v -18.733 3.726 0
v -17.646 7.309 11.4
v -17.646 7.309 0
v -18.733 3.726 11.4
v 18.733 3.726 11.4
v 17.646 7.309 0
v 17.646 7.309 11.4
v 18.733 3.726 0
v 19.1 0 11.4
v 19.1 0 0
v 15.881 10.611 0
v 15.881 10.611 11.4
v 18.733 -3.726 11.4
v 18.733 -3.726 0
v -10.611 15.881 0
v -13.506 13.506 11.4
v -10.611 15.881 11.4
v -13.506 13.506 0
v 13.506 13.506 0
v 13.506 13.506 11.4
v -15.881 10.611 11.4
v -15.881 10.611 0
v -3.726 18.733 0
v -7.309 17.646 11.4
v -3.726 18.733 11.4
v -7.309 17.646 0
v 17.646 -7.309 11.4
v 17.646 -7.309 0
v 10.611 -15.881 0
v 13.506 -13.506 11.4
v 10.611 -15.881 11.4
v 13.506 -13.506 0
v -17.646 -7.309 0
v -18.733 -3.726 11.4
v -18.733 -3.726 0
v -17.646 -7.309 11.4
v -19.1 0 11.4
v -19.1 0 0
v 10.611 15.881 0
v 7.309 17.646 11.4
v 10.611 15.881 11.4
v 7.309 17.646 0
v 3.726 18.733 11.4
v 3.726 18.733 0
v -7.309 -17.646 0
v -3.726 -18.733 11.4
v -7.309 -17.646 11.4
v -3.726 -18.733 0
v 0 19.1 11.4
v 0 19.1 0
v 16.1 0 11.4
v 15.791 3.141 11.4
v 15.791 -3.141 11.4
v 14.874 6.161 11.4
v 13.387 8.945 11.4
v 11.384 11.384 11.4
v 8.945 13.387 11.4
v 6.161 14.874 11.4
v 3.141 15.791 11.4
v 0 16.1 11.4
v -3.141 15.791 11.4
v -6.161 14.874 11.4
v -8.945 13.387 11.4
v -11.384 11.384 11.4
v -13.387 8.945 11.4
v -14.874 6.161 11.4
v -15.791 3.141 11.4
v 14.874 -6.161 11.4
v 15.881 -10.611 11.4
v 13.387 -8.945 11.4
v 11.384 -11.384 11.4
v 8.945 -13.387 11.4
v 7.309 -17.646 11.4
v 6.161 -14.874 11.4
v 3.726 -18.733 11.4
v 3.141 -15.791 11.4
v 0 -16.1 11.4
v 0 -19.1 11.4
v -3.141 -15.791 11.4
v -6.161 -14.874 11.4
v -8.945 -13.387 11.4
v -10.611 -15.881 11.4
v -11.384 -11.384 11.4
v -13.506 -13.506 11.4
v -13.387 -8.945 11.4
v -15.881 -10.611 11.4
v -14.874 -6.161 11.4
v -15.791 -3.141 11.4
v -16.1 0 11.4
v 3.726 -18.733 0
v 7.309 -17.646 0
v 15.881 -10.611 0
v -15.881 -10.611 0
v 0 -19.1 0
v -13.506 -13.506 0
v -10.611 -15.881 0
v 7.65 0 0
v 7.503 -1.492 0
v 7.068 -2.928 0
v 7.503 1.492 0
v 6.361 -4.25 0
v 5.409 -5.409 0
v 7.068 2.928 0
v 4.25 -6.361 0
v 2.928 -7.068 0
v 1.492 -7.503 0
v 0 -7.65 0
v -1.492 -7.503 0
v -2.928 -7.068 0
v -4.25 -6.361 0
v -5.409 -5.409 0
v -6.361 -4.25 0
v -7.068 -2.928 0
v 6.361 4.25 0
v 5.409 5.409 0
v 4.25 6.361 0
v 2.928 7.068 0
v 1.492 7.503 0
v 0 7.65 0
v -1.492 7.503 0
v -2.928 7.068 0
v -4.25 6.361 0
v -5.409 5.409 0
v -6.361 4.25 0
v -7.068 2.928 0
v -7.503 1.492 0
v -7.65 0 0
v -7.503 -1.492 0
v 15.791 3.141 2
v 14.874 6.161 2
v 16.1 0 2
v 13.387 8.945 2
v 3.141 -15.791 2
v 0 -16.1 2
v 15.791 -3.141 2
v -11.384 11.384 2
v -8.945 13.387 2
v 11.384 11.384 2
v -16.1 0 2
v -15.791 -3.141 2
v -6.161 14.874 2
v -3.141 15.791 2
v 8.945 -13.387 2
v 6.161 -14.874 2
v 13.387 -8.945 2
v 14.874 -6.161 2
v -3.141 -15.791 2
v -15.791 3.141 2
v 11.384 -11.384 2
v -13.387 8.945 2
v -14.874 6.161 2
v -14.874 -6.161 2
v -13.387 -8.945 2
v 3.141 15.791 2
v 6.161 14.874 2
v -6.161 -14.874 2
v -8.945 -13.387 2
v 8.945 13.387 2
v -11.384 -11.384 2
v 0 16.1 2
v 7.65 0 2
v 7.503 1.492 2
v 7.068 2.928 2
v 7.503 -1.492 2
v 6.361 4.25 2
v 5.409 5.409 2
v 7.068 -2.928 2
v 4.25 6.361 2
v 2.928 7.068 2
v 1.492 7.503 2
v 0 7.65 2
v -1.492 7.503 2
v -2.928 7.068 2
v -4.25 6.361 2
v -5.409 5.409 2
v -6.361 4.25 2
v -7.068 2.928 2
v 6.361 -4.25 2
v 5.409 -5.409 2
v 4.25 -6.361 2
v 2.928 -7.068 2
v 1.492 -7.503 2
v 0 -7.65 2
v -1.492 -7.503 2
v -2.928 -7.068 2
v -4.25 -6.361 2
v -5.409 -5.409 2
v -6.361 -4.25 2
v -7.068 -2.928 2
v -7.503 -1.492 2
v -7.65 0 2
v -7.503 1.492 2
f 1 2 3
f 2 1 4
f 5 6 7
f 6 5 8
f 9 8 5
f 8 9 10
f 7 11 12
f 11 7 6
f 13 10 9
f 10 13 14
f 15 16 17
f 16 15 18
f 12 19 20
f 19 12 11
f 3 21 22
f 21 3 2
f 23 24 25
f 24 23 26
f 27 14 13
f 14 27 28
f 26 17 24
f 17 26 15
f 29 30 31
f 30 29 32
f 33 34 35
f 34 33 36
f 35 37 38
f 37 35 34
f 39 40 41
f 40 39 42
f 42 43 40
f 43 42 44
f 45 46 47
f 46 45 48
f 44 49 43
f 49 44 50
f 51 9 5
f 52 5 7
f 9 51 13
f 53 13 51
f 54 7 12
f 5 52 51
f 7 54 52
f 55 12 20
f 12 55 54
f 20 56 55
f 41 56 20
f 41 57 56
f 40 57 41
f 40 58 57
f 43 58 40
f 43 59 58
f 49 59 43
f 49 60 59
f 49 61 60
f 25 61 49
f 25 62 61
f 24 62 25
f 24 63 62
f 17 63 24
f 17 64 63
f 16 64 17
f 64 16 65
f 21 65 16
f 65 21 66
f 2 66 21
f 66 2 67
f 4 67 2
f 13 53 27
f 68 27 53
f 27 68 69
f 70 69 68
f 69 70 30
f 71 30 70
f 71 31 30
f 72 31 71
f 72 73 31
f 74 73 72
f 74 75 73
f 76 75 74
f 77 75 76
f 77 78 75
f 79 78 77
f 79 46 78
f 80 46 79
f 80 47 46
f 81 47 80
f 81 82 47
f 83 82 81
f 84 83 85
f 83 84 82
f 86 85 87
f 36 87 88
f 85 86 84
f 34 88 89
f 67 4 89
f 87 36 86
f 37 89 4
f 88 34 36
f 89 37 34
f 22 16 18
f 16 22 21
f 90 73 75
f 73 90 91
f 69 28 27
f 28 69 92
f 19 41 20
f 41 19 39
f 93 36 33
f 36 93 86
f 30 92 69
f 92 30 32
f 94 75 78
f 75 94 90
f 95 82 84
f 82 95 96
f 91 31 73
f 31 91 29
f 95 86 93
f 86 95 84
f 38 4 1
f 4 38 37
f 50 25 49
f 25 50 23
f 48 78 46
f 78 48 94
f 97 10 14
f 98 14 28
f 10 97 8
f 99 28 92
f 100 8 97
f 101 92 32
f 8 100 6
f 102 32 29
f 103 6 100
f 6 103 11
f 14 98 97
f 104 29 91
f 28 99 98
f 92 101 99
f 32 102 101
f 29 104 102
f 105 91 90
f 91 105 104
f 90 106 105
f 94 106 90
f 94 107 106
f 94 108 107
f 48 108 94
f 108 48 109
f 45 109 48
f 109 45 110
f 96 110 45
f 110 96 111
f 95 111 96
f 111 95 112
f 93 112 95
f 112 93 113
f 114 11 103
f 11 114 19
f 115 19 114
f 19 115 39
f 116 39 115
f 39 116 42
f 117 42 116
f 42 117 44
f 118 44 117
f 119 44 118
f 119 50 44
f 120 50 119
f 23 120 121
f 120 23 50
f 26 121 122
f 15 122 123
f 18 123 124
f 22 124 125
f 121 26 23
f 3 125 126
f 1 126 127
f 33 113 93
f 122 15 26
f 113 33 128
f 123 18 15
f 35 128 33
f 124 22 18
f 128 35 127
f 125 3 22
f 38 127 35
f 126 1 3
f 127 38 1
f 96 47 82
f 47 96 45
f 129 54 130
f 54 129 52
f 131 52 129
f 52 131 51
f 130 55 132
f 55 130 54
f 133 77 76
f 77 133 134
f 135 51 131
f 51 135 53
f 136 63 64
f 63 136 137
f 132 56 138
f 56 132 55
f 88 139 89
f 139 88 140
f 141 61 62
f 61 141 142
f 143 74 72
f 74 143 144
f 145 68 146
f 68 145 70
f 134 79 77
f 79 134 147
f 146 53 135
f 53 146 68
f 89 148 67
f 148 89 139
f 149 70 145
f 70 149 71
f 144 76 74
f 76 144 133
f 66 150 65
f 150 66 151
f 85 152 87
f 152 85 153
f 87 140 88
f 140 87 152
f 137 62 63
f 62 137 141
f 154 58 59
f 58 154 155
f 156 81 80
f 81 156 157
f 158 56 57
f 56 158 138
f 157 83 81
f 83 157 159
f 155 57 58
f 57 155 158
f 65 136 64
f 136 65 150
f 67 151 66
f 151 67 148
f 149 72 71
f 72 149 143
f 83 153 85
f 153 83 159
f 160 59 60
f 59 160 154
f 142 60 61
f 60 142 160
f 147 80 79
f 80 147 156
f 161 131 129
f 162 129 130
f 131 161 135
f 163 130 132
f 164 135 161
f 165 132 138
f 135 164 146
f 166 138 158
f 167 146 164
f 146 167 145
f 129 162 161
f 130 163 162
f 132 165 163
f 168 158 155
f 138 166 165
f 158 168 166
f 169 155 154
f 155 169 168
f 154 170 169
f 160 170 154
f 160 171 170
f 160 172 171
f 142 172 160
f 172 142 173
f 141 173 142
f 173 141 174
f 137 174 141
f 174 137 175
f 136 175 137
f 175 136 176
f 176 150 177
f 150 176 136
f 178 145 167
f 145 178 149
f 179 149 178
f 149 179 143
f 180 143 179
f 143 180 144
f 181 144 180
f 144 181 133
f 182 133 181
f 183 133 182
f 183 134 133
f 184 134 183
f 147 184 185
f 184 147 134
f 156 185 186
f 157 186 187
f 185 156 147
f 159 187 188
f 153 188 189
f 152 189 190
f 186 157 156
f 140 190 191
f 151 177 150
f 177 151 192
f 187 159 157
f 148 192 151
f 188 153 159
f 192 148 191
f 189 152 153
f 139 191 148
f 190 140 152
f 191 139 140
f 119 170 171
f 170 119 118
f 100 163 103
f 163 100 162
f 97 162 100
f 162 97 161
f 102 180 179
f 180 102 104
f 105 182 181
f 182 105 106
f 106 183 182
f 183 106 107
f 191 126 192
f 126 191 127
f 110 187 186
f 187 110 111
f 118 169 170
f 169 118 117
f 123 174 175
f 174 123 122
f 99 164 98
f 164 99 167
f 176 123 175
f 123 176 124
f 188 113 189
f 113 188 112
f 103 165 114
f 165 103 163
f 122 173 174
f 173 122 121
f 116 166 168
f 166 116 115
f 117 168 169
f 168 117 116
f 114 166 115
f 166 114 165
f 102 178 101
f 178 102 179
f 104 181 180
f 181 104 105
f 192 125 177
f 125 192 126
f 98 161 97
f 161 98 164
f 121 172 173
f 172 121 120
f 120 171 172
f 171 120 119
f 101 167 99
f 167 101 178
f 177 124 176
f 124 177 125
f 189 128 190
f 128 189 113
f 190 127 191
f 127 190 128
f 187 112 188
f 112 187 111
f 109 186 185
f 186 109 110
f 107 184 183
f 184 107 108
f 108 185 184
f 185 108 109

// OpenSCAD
$fn = 32;

// ----------------------------------------------------------------------
// Bearing housing: seat for 6002 (32 x 9 mm), 38.2 mm body
// ----------------------------------------------------------------------

// --- parameters (mm) ---
housing_d = 38.2;         // housing outside diameter
housing_h = 11.4;         // overall housing height
wall_t = 3;               // wall thickness
seat_d = 32.2;            // 6002 seat, 0.2 mm clearance
seat_h = 9.4;             // pocket depth
shoulder = 2;             // shoulder under the bearing
pass_d = 15.3;            // shaft passage

module body() {
  cylinder(h = housing_h, d = housing_d);
}

difference() {
  union() {
    body();
  }
  translate([0, 0, housing_h - seat_h]) cylinder(h = seat_h + 1, d = seat_d);
  translate([0, 0, -1]) cylinder(h = housing_h - seat_h + 1, d = pass_d);
}
